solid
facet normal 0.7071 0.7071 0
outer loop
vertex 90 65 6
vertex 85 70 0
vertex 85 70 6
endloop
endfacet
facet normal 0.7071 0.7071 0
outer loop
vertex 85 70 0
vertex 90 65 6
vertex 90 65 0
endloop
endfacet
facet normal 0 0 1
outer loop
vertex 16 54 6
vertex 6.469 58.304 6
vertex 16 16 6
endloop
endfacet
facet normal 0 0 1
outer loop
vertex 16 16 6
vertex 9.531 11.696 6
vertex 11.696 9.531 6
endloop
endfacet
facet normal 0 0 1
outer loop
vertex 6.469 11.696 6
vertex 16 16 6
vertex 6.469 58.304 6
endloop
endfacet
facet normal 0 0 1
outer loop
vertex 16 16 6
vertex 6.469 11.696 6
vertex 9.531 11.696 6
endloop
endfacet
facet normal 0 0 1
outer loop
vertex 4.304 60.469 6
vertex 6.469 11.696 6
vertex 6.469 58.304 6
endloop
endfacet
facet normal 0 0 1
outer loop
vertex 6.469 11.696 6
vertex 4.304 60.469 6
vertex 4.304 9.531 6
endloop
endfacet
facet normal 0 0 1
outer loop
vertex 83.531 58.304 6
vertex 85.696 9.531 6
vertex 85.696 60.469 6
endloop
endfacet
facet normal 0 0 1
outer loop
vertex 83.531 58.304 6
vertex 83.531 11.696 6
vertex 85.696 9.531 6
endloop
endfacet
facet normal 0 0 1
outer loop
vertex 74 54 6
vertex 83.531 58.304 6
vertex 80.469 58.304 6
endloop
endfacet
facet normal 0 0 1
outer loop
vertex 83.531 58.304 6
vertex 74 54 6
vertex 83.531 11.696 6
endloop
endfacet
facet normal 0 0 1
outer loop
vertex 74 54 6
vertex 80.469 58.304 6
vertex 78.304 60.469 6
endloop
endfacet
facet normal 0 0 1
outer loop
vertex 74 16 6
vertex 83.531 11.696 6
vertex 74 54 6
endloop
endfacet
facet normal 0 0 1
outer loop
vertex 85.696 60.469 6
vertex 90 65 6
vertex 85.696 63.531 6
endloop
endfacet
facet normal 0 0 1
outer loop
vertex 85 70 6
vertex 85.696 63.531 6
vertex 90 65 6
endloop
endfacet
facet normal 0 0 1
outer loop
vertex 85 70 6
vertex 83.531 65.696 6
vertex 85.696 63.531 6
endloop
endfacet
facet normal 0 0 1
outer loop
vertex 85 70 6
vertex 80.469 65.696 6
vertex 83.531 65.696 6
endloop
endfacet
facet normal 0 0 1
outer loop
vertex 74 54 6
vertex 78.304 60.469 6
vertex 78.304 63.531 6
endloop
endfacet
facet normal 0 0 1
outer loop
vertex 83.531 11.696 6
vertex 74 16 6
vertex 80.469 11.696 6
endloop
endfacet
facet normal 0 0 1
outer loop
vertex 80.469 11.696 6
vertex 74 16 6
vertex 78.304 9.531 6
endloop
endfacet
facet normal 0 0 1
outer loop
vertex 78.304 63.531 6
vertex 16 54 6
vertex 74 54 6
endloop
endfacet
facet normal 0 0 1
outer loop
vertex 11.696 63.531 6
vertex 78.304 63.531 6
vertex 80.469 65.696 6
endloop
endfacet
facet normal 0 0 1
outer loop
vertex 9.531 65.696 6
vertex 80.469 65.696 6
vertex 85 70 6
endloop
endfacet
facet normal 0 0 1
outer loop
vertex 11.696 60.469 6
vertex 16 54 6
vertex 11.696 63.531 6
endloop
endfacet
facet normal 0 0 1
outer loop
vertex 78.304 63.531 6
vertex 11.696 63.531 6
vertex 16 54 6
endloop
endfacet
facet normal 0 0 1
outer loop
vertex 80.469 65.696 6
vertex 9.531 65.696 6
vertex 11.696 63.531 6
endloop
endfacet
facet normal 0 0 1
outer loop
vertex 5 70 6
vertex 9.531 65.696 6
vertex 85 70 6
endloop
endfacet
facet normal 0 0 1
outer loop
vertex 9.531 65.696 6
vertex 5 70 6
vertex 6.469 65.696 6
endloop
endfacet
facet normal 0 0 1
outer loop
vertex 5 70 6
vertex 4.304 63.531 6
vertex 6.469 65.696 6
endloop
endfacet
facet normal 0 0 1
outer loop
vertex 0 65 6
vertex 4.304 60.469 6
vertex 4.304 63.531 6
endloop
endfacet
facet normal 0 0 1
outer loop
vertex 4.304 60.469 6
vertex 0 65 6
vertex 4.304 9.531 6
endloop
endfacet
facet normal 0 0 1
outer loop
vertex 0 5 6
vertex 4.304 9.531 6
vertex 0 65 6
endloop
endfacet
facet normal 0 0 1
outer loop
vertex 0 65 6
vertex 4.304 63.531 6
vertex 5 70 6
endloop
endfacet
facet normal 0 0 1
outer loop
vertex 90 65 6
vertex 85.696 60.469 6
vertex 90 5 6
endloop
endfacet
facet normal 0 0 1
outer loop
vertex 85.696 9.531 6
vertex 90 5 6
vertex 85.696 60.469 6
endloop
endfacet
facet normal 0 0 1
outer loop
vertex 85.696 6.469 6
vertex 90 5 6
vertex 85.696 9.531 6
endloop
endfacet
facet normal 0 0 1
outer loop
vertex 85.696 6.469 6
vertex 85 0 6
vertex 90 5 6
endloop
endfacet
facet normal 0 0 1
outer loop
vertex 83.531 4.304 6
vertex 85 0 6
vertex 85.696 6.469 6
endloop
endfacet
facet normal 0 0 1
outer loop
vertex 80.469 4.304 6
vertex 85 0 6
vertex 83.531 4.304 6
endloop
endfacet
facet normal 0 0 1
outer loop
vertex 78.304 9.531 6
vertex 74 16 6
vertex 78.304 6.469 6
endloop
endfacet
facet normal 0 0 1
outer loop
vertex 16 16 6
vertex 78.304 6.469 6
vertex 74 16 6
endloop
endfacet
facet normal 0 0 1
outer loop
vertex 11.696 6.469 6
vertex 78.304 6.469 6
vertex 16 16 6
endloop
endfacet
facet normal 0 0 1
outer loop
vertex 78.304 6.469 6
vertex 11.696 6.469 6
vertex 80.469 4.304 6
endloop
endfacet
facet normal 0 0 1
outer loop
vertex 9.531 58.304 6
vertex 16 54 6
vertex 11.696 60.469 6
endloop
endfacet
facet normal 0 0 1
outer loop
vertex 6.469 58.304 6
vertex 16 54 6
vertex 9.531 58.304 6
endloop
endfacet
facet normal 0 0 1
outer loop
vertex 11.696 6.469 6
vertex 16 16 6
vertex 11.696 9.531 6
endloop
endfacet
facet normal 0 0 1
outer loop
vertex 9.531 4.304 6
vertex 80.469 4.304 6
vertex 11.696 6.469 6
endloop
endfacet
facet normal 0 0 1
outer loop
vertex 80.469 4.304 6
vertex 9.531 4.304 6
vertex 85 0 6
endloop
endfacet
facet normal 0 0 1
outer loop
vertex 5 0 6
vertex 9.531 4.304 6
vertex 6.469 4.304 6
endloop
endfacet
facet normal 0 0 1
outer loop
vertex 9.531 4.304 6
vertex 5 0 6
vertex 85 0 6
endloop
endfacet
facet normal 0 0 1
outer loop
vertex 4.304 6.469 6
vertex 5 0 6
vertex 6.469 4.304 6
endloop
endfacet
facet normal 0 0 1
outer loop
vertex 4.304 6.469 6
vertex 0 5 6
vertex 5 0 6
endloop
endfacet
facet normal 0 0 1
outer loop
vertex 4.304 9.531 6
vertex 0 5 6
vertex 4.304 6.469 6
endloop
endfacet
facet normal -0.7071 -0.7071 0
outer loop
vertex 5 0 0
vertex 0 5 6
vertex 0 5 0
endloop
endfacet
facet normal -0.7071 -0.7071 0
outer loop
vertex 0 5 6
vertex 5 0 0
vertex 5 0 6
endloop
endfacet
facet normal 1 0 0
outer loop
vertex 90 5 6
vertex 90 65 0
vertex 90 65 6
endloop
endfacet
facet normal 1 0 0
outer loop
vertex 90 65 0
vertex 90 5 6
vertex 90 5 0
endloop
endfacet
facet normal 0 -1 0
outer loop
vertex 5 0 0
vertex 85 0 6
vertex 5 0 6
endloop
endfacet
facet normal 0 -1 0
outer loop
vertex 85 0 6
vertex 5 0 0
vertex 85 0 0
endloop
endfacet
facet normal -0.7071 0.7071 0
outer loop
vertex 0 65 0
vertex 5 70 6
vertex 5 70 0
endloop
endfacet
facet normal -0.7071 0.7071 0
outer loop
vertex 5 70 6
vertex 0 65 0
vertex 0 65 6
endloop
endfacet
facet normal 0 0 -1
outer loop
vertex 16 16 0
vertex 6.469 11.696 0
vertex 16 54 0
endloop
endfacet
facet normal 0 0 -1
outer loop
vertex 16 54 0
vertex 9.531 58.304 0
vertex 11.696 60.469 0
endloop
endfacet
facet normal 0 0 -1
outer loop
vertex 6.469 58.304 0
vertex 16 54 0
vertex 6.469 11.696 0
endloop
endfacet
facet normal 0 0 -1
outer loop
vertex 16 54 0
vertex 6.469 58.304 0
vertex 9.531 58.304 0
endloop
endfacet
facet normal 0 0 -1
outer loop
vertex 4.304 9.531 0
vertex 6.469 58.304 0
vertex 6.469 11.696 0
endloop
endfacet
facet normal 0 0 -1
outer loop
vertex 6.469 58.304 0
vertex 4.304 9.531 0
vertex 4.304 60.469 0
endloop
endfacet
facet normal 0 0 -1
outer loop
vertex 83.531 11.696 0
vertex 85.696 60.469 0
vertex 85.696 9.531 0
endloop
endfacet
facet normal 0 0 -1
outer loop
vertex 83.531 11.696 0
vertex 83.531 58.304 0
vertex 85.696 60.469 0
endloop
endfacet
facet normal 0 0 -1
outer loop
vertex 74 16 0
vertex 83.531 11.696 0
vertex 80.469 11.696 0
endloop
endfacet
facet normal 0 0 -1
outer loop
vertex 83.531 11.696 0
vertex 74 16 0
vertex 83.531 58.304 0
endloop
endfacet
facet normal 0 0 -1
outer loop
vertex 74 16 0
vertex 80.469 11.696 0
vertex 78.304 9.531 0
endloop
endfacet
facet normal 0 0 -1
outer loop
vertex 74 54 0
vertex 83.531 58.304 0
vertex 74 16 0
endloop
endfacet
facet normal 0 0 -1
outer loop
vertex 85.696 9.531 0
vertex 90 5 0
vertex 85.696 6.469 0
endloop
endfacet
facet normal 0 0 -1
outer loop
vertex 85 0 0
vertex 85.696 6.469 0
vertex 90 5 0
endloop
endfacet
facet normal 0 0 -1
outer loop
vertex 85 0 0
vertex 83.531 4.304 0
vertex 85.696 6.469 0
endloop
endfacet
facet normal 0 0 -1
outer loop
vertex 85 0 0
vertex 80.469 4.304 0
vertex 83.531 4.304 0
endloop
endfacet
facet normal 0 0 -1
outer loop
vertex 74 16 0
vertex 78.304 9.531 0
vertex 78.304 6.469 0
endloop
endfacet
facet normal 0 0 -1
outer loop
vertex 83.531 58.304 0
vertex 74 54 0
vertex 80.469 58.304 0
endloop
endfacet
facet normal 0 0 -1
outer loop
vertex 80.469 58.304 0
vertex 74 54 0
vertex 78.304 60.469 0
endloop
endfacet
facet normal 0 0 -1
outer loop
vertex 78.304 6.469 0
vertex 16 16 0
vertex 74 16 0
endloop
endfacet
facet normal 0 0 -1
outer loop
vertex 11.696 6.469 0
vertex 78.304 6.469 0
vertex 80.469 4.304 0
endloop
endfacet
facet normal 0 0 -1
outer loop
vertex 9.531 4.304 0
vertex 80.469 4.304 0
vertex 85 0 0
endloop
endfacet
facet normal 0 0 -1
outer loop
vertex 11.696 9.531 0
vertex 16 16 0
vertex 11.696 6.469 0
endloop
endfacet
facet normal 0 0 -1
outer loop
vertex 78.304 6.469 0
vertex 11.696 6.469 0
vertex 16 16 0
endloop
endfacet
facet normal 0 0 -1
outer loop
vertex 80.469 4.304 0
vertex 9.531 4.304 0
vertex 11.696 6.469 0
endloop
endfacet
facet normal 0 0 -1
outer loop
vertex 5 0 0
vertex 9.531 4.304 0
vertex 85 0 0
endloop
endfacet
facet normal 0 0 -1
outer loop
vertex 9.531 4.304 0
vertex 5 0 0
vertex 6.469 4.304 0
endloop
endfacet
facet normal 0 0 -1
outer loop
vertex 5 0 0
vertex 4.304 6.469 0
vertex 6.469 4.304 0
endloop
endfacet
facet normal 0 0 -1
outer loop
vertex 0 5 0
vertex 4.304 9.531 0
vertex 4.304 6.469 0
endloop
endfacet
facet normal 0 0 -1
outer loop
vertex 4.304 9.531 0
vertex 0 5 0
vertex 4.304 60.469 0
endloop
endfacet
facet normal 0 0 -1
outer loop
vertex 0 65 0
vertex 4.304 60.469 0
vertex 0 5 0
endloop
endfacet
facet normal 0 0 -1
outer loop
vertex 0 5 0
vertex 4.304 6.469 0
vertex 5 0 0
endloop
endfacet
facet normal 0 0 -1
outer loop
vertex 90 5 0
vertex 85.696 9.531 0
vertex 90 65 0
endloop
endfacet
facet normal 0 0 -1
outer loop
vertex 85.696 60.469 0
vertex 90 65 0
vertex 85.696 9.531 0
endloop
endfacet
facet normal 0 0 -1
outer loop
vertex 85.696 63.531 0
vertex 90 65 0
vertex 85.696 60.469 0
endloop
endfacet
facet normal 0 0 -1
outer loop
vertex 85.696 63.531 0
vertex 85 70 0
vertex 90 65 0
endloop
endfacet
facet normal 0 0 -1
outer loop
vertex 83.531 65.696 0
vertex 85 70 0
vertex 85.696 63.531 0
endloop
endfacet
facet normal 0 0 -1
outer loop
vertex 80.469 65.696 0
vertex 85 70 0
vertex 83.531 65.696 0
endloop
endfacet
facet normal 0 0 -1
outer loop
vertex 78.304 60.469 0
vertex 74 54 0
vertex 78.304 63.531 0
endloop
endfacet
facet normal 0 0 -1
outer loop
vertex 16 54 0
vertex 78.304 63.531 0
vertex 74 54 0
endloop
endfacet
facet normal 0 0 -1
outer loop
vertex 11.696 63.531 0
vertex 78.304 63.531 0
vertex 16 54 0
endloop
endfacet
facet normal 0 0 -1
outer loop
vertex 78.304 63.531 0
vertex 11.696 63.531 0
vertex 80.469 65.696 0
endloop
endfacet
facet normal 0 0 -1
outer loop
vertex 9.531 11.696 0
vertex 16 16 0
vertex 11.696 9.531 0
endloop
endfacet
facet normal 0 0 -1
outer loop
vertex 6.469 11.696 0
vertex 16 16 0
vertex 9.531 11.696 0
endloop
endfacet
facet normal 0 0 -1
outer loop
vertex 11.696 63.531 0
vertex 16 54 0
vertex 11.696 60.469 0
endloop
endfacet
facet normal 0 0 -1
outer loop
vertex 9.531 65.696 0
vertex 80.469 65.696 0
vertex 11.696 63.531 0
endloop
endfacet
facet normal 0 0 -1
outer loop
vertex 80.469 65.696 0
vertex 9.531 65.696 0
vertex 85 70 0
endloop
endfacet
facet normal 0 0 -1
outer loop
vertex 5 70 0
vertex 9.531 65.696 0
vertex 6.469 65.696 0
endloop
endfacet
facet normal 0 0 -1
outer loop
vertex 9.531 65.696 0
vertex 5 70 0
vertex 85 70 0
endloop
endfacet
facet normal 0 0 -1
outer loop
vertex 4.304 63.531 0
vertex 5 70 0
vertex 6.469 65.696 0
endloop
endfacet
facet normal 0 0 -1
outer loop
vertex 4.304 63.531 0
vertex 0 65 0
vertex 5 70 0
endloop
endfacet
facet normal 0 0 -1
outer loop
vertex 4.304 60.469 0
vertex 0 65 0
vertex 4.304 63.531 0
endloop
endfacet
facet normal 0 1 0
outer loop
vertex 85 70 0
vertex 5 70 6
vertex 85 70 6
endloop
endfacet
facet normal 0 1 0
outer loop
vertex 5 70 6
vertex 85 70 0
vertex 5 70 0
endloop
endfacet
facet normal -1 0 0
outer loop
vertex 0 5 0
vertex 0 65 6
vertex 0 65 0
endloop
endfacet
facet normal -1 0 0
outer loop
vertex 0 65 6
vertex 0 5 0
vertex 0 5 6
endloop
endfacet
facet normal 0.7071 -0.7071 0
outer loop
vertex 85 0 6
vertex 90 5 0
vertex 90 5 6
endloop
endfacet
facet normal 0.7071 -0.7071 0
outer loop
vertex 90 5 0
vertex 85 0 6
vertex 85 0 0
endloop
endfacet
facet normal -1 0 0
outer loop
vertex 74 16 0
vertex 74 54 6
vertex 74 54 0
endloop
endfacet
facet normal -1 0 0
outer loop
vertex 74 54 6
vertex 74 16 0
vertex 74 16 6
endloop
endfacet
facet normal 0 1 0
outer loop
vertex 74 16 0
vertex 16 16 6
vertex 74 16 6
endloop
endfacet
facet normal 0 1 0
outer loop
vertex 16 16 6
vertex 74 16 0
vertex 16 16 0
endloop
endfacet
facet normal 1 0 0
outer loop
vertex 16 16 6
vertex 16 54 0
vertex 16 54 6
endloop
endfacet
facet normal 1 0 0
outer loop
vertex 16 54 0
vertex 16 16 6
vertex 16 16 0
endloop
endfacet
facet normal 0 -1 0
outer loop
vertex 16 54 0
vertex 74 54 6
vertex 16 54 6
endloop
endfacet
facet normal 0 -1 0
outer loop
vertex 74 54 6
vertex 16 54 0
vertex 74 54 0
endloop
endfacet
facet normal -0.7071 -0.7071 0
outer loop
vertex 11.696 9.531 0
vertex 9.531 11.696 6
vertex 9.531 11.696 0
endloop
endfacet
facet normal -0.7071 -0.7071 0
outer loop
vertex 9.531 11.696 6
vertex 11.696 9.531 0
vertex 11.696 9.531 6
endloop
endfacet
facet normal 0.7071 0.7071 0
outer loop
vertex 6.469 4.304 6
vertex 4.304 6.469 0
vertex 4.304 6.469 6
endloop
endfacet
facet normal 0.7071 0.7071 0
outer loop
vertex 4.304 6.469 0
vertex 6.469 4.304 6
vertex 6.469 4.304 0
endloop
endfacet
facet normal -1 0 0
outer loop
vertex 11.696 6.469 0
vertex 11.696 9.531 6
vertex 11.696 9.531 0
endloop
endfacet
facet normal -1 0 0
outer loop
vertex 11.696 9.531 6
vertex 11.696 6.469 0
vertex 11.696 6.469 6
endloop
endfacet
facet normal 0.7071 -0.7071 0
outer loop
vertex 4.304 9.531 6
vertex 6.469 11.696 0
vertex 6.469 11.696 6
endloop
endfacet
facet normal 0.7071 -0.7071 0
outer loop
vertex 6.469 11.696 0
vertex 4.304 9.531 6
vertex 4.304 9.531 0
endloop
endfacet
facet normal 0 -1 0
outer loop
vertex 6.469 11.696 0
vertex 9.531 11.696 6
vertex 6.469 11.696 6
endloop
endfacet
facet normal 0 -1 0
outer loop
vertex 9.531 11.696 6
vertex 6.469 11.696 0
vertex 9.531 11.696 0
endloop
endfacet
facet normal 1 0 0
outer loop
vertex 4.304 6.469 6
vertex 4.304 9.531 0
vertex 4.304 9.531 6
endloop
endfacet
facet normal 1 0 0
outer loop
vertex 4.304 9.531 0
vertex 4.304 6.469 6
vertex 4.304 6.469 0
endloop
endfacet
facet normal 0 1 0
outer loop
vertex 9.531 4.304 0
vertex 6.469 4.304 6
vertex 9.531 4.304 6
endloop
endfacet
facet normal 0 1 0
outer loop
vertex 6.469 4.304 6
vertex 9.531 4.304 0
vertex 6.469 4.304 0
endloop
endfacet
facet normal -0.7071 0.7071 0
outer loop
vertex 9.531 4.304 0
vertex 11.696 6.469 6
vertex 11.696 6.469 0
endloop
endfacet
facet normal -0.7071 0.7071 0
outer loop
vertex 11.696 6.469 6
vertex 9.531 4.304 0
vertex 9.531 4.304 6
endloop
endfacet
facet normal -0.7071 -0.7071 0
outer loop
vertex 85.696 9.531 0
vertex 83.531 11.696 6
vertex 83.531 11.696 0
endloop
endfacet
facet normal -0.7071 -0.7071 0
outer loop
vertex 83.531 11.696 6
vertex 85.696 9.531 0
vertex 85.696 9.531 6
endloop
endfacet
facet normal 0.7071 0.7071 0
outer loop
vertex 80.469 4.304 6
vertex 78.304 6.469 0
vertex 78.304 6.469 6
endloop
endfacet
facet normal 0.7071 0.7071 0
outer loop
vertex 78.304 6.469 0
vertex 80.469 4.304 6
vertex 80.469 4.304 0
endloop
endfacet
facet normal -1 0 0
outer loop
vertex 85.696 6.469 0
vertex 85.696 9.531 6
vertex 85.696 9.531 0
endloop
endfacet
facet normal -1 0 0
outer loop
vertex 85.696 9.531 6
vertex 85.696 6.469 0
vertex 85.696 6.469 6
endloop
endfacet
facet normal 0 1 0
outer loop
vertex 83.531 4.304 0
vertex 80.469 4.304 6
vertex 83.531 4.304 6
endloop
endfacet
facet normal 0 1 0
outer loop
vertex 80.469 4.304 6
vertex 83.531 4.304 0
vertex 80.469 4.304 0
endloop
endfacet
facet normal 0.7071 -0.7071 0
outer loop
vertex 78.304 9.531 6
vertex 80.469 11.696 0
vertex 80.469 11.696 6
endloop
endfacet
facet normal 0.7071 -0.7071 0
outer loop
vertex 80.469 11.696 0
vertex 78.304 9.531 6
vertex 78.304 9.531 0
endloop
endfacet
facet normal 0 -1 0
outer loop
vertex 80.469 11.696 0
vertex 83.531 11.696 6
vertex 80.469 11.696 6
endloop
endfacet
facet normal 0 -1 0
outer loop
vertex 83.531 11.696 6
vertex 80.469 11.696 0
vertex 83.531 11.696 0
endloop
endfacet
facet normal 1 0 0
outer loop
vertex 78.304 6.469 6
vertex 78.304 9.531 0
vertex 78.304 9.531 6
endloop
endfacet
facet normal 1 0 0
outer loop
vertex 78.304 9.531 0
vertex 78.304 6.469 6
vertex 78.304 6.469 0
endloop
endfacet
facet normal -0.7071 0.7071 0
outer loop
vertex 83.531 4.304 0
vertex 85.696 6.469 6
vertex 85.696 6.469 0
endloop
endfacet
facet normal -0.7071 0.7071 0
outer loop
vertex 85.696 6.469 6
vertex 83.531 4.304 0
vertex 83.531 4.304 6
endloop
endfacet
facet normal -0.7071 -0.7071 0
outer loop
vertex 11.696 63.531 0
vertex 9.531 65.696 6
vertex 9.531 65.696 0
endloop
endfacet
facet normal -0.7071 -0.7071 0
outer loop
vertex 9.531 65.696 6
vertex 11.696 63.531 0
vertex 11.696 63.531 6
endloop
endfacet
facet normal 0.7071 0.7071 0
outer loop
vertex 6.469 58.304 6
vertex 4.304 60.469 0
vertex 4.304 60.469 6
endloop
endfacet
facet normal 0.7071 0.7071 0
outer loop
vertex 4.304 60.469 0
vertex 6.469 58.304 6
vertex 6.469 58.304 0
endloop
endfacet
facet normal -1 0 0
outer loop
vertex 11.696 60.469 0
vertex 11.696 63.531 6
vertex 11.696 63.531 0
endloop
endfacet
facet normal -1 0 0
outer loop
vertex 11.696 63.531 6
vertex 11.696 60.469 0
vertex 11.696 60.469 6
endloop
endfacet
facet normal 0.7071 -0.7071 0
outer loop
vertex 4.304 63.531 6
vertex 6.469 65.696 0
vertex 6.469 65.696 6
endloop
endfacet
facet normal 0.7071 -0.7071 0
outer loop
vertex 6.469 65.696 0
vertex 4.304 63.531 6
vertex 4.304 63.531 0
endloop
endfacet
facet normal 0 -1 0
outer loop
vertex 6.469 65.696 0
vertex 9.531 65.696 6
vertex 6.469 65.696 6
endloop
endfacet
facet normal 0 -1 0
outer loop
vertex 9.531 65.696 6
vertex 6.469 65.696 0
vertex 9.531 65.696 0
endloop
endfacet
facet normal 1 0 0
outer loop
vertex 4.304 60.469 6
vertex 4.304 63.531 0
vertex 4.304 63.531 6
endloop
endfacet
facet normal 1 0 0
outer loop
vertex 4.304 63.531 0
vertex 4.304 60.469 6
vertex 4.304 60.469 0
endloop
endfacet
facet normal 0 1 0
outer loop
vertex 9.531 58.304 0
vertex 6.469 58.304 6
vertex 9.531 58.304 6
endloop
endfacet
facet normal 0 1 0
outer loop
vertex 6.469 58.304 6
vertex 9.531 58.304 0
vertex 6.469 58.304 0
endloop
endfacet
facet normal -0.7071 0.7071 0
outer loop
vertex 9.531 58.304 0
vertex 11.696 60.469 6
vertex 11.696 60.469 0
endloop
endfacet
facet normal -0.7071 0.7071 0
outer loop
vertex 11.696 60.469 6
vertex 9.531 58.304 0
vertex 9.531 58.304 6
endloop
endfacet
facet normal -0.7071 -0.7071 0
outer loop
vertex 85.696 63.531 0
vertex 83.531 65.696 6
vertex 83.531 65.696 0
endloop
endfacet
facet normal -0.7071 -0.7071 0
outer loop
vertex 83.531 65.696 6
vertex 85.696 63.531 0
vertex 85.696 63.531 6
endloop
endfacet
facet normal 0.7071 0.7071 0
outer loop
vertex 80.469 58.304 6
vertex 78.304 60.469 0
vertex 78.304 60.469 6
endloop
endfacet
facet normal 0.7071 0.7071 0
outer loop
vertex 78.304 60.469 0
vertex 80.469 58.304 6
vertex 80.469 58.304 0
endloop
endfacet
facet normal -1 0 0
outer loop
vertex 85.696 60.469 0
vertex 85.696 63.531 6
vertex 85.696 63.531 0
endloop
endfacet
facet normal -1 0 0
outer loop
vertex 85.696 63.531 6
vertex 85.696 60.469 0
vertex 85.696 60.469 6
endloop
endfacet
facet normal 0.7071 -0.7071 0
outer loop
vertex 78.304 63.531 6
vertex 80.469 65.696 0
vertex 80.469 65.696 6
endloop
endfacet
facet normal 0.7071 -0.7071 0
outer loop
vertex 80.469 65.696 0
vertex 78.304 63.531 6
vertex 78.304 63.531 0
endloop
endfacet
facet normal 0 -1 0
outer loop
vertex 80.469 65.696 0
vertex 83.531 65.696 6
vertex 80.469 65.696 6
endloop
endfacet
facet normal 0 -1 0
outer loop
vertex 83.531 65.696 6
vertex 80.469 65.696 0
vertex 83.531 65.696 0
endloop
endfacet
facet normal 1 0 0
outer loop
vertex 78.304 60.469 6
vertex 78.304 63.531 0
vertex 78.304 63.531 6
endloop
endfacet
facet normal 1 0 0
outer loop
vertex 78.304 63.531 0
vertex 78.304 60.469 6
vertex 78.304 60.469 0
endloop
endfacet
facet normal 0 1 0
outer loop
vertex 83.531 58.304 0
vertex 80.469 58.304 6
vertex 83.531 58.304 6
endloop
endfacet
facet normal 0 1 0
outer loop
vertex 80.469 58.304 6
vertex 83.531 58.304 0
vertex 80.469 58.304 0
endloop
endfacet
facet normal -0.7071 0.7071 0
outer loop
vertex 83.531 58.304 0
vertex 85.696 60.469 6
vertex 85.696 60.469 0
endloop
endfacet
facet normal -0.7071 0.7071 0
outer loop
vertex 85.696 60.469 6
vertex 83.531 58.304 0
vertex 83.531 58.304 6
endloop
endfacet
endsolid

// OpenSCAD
$fn = 32;

// ----------------------------------------------------------------------
// Frame plate: 90 x 70 frame, 16 mm rails
// ----------------------------------------------------------------------

// --- parameters (mm) ---
plate_l = 90;             // plate length, X
plate_w = 70;             // plate width, Y
plate_t = 6;              // plate thickness, Z (extrusion height)
corner_c = 5;             // corner chamfer
frame_bar = 16;           // frame rail width
bolt_r = 4;               // corner bolt window radius
bolt_inset = 8;           // bolt centre inset from the edges

win_l = plate_l - 2 * frame_bar;  // window length
win_w = plate_w - 2 * frame_bar;  // window width
bolt_d = 2 * bolt_r;  // corner hole diameter

profile = [[5, 0], [85, 0], [90, 5], [90, 65], [85, 70], [5, 70], [0, 65], [0, 5]];  // primary outline, 8 points, counter clockwise
void_1 = [[16, 16], [74, 16], [74, 54], [16, 54]];  // the window, 4 points
void_2 = [[11.696, 9.531], [9.531, 11.696], [6.469, 11.696], [4.304, 9.531], [4.304, 6.469], [6.469, 4.304], [9.531, 4.304], [11.696, 6.469]];  // corner bolt window, 8 points
void_3 = [[85.696, 9.531], [83.531, 11.696], [80.469, 11.696], [78.304, 9.531], [78.304, 6.469], [80.469, 4.304], [83.531, 4.304], [85.696, 6.469]];  // corner bolt window, 8 points
void_4 = [[11.696, 63.531], [9.531, 65.696], [6.469, 65.696], [4.304, 63.531], [4.304, 60.469], [6.469, 58.304], [9.531, 58.304], [11.696, 60.469]];  // corner bolt window, 8 points
void_5 = [[85.696, 63.531], [83.531, 65.696], [80.469, 65.696], [78.304, 63.531], [78.304, 60.469], [80.469, 58.304], [83.531, 58.304], [85.696, 60.469]];  // corner bolt window, 8 points

// --- the one profile operation ---
difference() {
  linear_extrude(height = plate_t) polygon(points = profile);
  translate([0, 0, -1])
    linear_extrude(height = plate_t + 2) polygon(points = void_1);
  translate([0, 0, -1])
    linear_extrude(height = plate_t + 2) polygon(points = void_2);
  translate([0, 0, -1])
    linear_extrude(height = plate_t + 2) polygon(points = void_3);
  translate([0, 0, -1])
    linear_extrude(height = plate_t + 2) polygon(points = void_4);
  translate([0, 0, -1])
    linear_extrude(height = plate_t + 2) polygon(points = void_5);
}
